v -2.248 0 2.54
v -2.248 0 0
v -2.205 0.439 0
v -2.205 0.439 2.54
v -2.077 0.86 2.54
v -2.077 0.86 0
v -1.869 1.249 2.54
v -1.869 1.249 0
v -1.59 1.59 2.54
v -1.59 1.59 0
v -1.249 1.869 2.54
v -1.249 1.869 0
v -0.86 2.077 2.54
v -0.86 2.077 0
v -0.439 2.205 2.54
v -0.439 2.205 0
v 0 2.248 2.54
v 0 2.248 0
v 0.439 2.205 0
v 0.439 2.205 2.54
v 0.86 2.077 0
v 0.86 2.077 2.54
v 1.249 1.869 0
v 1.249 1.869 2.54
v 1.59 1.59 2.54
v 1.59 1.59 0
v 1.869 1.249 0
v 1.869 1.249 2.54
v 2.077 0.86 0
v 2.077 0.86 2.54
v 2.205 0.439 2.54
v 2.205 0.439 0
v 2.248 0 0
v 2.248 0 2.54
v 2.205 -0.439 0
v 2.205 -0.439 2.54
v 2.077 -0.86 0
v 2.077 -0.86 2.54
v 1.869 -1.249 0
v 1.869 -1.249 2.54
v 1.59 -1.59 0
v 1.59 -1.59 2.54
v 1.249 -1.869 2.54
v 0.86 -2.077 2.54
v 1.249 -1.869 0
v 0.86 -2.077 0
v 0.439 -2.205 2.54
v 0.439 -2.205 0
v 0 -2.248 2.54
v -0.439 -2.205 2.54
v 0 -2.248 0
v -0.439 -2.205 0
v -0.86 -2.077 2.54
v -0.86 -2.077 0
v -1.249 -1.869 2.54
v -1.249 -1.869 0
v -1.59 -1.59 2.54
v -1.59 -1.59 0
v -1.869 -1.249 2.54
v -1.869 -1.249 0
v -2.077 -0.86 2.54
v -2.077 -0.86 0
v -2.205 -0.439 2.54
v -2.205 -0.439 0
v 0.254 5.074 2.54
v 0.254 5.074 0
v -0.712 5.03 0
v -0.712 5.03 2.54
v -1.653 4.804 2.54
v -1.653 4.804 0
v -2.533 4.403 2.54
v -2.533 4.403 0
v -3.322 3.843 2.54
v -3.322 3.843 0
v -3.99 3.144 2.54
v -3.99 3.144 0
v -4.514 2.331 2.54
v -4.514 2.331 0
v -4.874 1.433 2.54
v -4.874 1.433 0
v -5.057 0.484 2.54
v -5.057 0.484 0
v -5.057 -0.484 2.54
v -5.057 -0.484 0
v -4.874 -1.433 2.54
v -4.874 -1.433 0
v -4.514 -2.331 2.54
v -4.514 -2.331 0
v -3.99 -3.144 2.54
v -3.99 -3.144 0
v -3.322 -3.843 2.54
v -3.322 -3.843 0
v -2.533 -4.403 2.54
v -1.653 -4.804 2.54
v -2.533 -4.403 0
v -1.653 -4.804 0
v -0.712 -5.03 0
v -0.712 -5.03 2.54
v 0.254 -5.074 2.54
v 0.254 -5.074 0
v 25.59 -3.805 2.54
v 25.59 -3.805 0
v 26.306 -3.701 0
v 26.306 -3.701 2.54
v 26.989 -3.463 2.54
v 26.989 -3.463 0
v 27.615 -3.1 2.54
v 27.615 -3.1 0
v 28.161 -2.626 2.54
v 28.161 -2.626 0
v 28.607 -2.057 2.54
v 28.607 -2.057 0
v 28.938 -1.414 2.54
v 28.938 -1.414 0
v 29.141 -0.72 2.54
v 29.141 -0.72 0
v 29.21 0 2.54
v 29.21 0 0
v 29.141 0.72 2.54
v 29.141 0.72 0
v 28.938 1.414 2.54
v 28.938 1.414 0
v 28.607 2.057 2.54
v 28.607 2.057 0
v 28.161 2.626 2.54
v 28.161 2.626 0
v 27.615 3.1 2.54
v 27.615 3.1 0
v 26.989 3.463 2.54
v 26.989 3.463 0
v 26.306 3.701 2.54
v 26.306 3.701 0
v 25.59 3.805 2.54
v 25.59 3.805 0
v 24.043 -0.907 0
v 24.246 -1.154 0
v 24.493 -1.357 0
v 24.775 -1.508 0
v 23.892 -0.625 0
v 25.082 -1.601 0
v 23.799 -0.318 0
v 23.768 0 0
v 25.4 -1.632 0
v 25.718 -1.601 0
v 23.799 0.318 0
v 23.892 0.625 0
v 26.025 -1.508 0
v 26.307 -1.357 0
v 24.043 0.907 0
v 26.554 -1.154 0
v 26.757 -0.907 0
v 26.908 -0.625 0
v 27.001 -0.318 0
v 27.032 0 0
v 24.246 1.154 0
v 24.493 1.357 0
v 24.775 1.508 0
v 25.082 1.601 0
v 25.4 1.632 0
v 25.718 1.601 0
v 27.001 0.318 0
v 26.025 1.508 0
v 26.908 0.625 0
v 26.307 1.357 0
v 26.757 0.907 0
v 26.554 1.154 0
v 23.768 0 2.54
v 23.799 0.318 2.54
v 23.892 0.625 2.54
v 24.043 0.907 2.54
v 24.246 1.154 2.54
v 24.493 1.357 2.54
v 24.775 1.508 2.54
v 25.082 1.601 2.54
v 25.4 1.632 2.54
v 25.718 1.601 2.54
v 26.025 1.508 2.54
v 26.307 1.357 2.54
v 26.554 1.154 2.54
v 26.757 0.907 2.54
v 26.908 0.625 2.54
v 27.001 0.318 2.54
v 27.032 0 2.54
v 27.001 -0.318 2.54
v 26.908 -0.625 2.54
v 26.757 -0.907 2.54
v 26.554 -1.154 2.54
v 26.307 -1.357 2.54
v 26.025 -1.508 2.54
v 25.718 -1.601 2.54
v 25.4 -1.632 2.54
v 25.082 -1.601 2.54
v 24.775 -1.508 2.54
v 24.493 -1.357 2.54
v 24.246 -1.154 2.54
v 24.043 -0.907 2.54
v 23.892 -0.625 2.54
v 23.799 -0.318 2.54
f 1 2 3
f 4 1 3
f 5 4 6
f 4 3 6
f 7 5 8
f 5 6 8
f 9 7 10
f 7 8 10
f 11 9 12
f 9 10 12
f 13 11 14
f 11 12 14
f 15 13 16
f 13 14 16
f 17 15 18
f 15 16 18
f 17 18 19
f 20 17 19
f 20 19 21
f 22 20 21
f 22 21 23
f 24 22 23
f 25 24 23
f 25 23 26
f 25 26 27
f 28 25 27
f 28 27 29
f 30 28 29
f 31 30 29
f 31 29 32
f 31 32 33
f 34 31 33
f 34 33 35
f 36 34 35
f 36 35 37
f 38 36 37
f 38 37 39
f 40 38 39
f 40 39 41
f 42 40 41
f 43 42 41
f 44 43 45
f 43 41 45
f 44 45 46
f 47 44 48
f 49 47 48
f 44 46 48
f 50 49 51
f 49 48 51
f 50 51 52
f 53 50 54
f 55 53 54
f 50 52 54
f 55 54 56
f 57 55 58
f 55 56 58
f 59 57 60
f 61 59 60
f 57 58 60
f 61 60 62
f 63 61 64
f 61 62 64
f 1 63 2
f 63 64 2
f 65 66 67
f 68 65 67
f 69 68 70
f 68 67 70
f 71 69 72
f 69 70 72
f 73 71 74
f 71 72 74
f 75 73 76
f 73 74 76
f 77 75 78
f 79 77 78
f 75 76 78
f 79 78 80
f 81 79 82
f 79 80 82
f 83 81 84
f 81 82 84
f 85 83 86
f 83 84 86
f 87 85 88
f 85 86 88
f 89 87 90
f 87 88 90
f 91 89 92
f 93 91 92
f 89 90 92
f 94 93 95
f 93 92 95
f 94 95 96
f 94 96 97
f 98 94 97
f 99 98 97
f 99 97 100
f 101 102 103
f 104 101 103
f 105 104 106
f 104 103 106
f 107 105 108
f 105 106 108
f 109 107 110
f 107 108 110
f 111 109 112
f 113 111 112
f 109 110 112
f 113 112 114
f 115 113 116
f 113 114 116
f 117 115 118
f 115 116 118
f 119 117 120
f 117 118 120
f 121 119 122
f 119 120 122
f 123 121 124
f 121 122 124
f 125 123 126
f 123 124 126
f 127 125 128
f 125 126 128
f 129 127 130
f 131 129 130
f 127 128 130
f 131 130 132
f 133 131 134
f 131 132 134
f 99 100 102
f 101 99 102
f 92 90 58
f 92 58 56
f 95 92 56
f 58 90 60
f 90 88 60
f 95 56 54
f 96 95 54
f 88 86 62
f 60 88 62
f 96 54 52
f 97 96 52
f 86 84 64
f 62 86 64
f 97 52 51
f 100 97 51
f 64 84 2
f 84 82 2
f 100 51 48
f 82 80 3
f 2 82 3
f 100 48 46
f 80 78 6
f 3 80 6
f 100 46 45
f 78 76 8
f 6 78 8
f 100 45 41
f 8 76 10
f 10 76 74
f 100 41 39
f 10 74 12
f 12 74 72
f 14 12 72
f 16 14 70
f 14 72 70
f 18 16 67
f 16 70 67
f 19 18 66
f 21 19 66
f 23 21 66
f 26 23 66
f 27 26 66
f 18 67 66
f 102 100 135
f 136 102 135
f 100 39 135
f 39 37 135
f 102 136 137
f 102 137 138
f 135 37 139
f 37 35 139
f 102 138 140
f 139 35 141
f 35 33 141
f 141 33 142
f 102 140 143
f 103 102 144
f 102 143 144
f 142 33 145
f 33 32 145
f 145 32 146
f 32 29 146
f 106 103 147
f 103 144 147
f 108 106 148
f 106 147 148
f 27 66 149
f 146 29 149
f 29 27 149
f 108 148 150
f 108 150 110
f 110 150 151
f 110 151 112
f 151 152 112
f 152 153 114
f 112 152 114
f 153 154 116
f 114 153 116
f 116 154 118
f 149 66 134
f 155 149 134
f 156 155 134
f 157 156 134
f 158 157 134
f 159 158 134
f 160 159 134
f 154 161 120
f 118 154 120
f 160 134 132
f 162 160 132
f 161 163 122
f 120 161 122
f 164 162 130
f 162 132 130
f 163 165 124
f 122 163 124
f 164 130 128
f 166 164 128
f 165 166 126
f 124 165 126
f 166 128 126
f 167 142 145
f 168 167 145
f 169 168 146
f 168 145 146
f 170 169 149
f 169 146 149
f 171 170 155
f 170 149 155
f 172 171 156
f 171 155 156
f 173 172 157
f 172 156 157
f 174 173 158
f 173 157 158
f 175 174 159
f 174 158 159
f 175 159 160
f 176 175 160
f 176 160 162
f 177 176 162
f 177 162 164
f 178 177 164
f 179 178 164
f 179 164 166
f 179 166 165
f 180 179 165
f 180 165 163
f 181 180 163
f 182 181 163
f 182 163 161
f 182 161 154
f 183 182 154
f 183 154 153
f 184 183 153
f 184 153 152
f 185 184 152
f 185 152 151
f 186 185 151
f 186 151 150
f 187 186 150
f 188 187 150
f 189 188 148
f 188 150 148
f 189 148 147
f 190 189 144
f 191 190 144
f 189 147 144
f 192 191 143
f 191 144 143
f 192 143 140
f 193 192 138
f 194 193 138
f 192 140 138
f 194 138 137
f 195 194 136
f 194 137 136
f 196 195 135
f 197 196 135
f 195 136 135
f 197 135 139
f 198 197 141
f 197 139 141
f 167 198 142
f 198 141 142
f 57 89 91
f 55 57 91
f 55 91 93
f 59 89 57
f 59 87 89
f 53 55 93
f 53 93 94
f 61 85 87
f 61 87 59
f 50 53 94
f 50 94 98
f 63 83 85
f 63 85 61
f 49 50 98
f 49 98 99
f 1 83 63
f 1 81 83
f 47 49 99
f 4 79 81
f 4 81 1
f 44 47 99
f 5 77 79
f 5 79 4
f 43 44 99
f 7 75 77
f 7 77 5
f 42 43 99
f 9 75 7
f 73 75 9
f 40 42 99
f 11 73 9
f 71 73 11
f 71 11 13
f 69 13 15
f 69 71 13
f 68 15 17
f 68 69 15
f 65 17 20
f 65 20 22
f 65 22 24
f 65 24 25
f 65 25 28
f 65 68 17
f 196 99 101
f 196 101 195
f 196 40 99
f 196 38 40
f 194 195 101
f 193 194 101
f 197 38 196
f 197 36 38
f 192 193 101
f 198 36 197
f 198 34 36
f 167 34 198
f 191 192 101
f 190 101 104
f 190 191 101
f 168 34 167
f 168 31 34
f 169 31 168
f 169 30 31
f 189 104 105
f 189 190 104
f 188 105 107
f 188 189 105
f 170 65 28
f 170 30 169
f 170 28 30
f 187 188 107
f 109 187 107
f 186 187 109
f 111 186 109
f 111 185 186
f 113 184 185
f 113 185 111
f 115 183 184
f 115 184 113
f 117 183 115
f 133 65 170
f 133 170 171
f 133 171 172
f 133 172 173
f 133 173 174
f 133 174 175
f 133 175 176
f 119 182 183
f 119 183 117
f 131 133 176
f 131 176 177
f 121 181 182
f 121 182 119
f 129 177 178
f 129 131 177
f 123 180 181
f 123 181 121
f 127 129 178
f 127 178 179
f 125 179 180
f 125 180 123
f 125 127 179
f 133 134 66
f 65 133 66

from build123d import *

# Parameters (mm, degrees)
BOSS_EXTRUDE1_DEPTH   = 2.54
F_8_CLEARANCE_HOLE1_D = 4.4958
F_4_CLEARANCE_HOLE1_D = 3.2639


with BuildPart() as part:
    # Sketch1 → Boss-Extrude1 (new body)
    with BuildSketch(Plane.XY):
        with BuildLine():
            Line((0.254, -5.073646026), (25.5905, -3.80523452))
            ThreePointArc((25.5905, -3.80523452), (29.21, 0), (25.5905, 3.80523452))
            Line((25.5905, 3.80523452), (0.254, 5.073646026))
            ThreePointArc((0.254, 5.073646026), (-5.08, 0), (0.254, -5.073646026))
        make_face()
    extrude(amount=BOSS_EXTRUDE1_DEPTH)

    # #8 Clearance Hole1 (through all)
    with Locations(Plane.XY.offset(2.54)):
        with Locations((0, 0)):
            Hole(F_8_CLEARANCE_HOLE1_D / 2)

    # #4 Clearance Hole1 (through all)
    with Locations(Plane(origin=(25.4, 0, 2.54), x_dir=(1, 0, 0), z_dir=(0, 0, 1))):
        with Locations((0, 0)):
            Hole(F_4_CLEARANCE_HOLE1_D / 2)


solid = part.part
